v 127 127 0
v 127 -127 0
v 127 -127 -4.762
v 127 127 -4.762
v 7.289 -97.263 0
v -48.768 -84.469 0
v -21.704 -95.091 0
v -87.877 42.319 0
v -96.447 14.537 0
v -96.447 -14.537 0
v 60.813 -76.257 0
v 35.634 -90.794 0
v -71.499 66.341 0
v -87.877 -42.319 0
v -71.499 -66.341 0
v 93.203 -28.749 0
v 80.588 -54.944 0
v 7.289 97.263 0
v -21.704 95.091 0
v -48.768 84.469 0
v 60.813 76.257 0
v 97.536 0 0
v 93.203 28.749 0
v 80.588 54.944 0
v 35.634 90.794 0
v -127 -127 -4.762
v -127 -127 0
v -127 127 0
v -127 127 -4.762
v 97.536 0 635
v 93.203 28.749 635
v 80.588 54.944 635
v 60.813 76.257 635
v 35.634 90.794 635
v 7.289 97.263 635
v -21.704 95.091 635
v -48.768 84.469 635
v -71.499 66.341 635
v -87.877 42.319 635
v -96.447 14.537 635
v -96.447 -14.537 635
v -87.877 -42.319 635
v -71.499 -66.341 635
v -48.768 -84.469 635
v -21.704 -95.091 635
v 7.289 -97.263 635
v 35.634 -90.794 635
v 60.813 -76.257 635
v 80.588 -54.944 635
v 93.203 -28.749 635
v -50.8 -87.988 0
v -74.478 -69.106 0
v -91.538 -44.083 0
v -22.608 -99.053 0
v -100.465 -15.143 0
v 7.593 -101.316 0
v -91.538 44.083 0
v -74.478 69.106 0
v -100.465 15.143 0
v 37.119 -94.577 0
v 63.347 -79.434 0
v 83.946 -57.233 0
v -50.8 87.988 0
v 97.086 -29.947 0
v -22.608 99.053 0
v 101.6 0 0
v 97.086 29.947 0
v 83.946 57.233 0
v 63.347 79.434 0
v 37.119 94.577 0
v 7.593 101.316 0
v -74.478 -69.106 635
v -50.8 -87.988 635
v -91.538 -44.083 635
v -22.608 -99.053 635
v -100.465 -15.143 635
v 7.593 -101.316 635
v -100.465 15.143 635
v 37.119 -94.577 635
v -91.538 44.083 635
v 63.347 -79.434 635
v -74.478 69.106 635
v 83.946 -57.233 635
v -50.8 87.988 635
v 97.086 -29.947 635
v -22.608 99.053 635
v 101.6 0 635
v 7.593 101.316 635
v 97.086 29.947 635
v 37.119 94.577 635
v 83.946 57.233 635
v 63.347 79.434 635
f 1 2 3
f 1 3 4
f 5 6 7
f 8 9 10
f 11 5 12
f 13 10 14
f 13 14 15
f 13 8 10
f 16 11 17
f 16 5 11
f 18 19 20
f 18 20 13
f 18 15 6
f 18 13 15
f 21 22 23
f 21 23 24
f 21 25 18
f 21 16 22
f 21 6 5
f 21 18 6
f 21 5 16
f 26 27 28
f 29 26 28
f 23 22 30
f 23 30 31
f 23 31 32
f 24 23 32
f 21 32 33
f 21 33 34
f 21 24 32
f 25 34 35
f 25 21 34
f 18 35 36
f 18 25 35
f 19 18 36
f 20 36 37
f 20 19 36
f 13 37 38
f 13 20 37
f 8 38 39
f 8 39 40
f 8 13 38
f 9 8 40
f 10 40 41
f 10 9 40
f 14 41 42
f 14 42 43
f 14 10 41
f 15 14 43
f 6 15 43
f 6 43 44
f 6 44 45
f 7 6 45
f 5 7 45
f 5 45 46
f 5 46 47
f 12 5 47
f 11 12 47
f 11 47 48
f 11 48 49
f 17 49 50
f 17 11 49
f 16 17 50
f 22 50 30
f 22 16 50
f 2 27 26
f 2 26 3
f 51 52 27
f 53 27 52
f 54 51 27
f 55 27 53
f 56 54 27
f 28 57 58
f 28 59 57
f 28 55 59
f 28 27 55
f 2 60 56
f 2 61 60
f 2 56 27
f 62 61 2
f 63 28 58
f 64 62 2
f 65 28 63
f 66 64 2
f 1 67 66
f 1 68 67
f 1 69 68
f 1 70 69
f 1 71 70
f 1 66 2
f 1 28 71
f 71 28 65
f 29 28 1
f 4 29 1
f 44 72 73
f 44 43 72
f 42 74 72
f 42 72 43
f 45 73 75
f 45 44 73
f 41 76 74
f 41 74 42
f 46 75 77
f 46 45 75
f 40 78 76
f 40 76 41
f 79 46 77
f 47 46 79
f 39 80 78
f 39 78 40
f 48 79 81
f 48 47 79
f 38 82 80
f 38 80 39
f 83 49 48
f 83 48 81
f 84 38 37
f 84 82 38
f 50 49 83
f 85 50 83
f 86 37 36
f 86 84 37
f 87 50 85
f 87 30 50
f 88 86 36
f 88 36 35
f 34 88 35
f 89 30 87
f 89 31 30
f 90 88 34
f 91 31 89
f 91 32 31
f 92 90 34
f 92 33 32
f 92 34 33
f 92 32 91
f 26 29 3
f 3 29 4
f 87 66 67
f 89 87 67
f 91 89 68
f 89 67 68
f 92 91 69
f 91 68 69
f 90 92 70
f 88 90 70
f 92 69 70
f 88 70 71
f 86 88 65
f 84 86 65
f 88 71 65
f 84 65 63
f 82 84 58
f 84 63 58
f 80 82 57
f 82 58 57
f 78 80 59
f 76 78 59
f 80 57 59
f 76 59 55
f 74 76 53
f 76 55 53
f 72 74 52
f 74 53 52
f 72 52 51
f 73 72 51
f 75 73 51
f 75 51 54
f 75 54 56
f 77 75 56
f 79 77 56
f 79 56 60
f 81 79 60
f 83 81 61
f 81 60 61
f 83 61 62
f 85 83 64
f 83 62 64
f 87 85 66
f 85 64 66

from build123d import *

# Parameters (mm, degrees)
F0_R     = 101.6
F0_R_2   = 97.536
F1_DEPTH = 635
F2_W     = 254
F2_H     = 254
F3_DEPTH = 4.7625


with BuildPart() as f1:
    # F0 (on Top) → F1 (new body)
    with BuildSketch(Plane.XY):
        Circle(F0_R)
        Circle(F0_R_2, mode=Mode.SUBTRACT)
    extrude(amount=F1_DEPTH)

    # F2 (on Top) → F3 (join)
    with BuildSketch(Plane.XY):
        Rectangle(F2_W, F2_H)
    extrude(amount=-F3_DEPTH)


solid = f1.part
